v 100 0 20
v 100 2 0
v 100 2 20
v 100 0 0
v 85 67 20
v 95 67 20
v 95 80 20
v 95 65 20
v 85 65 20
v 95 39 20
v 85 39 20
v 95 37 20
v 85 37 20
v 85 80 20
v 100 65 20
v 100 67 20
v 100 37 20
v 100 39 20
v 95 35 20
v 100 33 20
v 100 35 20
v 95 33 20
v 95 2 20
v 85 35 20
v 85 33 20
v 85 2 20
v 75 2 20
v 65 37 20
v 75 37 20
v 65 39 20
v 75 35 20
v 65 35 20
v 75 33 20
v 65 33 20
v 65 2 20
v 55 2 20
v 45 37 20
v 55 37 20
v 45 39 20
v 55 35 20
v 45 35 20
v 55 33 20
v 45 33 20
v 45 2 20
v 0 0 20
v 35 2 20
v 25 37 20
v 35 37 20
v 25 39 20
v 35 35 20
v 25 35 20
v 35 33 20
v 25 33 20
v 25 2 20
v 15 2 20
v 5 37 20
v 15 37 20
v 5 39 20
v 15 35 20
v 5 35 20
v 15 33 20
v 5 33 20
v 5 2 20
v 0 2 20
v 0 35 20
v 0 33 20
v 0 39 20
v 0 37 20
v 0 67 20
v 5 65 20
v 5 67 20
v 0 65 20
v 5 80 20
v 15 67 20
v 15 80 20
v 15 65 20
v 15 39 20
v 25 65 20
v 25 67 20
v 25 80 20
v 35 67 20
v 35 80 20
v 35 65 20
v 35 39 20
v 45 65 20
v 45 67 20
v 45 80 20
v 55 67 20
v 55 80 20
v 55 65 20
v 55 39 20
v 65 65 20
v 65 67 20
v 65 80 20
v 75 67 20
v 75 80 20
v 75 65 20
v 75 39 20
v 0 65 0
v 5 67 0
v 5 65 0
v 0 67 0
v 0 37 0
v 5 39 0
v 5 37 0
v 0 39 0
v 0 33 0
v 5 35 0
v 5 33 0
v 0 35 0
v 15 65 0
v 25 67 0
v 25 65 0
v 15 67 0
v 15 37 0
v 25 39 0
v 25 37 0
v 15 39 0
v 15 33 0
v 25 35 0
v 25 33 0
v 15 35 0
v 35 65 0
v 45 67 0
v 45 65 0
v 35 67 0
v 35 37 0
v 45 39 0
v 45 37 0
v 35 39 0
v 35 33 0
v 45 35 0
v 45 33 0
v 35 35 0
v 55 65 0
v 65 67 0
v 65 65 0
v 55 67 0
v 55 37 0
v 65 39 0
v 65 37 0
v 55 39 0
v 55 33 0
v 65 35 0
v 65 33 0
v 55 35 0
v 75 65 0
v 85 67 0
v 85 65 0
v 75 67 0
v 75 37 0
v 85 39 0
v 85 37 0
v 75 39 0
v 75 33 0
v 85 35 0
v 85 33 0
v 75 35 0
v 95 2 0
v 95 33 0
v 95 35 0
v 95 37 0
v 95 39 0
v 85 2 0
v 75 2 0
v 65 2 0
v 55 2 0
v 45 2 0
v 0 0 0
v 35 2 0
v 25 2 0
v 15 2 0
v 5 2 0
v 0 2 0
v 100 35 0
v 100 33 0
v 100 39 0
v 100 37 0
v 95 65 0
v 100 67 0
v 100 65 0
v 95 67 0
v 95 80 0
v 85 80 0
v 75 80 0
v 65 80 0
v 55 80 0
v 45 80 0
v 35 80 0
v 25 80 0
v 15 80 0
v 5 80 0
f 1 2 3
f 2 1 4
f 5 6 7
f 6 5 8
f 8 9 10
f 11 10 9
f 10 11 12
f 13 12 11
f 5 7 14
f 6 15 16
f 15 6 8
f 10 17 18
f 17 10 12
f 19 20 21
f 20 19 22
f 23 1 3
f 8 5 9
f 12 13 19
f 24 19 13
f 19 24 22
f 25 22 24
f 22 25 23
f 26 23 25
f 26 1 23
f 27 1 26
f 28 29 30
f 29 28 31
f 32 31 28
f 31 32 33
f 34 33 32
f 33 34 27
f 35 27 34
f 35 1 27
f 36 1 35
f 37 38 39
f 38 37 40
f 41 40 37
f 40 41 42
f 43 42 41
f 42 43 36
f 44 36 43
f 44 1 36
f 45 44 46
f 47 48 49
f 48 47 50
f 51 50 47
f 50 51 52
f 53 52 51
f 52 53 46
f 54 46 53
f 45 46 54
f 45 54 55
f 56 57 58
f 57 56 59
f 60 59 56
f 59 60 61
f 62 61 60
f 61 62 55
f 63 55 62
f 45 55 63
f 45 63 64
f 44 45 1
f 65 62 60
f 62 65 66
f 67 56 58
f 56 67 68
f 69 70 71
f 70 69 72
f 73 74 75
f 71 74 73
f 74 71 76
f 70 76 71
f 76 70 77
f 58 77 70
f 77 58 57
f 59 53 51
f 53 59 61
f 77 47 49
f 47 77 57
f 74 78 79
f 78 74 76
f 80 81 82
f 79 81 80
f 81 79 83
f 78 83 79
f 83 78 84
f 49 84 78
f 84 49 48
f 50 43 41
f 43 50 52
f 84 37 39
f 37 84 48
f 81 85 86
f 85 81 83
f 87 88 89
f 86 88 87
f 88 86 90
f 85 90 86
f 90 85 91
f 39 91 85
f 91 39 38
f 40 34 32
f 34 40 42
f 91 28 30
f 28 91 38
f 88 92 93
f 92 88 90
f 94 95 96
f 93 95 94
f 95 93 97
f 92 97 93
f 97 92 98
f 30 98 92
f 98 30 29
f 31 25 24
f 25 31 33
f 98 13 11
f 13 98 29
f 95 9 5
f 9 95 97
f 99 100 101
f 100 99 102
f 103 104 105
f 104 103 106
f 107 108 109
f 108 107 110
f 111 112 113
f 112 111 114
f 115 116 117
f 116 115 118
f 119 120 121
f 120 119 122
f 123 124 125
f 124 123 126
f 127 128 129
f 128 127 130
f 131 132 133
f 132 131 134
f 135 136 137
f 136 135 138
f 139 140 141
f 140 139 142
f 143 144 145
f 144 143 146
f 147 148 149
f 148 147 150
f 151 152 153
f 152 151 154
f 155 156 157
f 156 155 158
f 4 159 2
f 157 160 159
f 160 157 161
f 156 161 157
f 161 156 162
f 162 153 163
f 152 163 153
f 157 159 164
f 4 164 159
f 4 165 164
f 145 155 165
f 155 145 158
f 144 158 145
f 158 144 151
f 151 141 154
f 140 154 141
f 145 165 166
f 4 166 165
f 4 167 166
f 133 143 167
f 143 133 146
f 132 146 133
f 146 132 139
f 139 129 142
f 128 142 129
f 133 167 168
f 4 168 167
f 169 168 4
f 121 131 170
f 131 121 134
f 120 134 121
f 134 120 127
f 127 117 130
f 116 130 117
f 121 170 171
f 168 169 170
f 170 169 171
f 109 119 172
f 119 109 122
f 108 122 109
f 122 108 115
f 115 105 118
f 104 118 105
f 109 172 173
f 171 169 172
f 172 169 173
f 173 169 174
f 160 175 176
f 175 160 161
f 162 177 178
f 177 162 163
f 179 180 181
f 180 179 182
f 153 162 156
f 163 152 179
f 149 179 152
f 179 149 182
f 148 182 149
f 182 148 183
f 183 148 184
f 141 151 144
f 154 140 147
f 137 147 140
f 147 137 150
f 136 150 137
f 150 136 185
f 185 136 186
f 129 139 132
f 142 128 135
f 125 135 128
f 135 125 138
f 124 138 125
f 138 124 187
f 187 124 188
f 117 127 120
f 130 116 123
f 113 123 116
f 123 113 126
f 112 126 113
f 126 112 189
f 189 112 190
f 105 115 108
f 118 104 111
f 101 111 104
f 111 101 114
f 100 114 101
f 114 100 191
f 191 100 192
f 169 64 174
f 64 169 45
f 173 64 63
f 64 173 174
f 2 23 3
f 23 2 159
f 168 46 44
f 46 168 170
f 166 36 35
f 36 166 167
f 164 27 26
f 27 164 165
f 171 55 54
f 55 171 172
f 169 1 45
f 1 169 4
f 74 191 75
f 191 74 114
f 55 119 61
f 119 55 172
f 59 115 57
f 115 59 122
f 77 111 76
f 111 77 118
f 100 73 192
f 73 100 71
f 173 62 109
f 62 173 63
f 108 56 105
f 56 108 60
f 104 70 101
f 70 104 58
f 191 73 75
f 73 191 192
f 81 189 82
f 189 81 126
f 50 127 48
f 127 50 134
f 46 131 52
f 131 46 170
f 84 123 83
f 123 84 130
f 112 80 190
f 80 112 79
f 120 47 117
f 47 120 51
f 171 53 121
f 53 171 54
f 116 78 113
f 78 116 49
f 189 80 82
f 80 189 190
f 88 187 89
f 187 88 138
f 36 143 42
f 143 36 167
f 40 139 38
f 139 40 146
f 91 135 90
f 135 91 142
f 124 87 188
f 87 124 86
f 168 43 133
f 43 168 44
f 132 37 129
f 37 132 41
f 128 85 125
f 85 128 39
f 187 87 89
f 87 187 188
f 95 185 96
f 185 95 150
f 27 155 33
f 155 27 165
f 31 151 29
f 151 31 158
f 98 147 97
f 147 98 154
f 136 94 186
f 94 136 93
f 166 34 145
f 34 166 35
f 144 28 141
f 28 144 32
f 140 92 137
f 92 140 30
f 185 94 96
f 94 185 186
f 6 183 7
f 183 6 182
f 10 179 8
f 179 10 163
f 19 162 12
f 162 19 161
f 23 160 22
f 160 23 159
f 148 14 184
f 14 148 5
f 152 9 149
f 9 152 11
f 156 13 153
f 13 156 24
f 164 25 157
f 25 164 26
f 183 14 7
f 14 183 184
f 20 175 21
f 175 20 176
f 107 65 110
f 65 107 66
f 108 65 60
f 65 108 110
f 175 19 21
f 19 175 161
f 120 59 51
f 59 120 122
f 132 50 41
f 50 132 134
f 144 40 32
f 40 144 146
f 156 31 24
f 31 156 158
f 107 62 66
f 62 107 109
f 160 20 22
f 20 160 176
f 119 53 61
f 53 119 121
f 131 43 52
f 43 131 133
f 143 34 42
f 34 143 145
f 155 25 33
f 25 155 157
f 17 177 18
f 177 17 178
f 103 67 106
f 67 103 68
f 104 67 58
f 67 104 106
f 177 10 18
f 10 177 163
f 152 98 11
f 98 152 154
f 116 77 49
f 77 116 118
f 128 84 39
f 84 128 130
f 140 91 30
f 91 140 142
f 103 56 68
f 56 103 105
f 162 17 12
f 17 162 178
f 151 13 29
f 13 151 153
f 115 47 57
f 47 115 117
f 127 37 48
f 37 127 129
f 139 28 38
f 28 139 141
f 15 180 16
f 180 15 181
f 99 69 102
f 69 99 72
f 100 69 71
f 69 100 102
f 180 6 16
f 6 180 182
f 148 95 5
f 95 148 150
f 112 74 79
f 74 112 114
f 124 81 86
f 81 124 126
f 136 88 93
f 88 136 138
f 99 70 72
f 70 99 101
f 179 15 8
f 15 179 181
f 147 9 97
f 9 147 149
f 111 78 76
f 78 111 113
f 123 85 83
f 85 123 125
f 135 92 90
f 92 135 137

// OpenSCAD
cube([100, 2, 20]); color([0.1,0.4,0])  // параллелепипед со сторонами 100,2,20  мм
cube([100, 2, 20]); color([0.1,0.4,0])  // параллелепипед со сторонами 100,2,20  мм  
  translate([5,0,0]) cube([10, 80, 20]); color([0.56,0.23,0])  // параллелепипед со сторонами 10,8,20  мм 
  translate([25,0,0]) cube([10, 80, 20]); color([0.56,0.23,0])   //параллелепипед со сторонами 10,8,20  мм
 translate([45,0,0]) cube([10, 80, 20]); color([0.56,0.23,0])  //параллелепипед со сторонами 10,8,20  мм
 translate([65,0,0]) cube([10, 80, 20]); color([0.1,0.4,0])  //параллелепипед со сторонами 10,8,20  мм
translate([85,0,0]) cube([10, 80, 20]);  //параллелепипед со сторонами 10,8,20  мм 
translate([85,0,0]) cube([10, 80, 20]);  //параллелепипед со сторонами 10,8,20  мм
cube([100, 1, 20]);  //параллелепипед со сторонами 100,1,20  мм
translate([0,33,0]) cube([100, 2, 20]);  //параллелепипед со сторонами 100,2,20  мм
cube([100, 1, 20]);
translate([0,37,0]) cube([100, 2, 20]);  //параллелепипед со сторонами 100,1,20  мм
cube([100, 1, 20]);
translate([0,65,0]) cube([100, 2, 20]);  //параллелепипед со сторонами 100,1,20  мм
